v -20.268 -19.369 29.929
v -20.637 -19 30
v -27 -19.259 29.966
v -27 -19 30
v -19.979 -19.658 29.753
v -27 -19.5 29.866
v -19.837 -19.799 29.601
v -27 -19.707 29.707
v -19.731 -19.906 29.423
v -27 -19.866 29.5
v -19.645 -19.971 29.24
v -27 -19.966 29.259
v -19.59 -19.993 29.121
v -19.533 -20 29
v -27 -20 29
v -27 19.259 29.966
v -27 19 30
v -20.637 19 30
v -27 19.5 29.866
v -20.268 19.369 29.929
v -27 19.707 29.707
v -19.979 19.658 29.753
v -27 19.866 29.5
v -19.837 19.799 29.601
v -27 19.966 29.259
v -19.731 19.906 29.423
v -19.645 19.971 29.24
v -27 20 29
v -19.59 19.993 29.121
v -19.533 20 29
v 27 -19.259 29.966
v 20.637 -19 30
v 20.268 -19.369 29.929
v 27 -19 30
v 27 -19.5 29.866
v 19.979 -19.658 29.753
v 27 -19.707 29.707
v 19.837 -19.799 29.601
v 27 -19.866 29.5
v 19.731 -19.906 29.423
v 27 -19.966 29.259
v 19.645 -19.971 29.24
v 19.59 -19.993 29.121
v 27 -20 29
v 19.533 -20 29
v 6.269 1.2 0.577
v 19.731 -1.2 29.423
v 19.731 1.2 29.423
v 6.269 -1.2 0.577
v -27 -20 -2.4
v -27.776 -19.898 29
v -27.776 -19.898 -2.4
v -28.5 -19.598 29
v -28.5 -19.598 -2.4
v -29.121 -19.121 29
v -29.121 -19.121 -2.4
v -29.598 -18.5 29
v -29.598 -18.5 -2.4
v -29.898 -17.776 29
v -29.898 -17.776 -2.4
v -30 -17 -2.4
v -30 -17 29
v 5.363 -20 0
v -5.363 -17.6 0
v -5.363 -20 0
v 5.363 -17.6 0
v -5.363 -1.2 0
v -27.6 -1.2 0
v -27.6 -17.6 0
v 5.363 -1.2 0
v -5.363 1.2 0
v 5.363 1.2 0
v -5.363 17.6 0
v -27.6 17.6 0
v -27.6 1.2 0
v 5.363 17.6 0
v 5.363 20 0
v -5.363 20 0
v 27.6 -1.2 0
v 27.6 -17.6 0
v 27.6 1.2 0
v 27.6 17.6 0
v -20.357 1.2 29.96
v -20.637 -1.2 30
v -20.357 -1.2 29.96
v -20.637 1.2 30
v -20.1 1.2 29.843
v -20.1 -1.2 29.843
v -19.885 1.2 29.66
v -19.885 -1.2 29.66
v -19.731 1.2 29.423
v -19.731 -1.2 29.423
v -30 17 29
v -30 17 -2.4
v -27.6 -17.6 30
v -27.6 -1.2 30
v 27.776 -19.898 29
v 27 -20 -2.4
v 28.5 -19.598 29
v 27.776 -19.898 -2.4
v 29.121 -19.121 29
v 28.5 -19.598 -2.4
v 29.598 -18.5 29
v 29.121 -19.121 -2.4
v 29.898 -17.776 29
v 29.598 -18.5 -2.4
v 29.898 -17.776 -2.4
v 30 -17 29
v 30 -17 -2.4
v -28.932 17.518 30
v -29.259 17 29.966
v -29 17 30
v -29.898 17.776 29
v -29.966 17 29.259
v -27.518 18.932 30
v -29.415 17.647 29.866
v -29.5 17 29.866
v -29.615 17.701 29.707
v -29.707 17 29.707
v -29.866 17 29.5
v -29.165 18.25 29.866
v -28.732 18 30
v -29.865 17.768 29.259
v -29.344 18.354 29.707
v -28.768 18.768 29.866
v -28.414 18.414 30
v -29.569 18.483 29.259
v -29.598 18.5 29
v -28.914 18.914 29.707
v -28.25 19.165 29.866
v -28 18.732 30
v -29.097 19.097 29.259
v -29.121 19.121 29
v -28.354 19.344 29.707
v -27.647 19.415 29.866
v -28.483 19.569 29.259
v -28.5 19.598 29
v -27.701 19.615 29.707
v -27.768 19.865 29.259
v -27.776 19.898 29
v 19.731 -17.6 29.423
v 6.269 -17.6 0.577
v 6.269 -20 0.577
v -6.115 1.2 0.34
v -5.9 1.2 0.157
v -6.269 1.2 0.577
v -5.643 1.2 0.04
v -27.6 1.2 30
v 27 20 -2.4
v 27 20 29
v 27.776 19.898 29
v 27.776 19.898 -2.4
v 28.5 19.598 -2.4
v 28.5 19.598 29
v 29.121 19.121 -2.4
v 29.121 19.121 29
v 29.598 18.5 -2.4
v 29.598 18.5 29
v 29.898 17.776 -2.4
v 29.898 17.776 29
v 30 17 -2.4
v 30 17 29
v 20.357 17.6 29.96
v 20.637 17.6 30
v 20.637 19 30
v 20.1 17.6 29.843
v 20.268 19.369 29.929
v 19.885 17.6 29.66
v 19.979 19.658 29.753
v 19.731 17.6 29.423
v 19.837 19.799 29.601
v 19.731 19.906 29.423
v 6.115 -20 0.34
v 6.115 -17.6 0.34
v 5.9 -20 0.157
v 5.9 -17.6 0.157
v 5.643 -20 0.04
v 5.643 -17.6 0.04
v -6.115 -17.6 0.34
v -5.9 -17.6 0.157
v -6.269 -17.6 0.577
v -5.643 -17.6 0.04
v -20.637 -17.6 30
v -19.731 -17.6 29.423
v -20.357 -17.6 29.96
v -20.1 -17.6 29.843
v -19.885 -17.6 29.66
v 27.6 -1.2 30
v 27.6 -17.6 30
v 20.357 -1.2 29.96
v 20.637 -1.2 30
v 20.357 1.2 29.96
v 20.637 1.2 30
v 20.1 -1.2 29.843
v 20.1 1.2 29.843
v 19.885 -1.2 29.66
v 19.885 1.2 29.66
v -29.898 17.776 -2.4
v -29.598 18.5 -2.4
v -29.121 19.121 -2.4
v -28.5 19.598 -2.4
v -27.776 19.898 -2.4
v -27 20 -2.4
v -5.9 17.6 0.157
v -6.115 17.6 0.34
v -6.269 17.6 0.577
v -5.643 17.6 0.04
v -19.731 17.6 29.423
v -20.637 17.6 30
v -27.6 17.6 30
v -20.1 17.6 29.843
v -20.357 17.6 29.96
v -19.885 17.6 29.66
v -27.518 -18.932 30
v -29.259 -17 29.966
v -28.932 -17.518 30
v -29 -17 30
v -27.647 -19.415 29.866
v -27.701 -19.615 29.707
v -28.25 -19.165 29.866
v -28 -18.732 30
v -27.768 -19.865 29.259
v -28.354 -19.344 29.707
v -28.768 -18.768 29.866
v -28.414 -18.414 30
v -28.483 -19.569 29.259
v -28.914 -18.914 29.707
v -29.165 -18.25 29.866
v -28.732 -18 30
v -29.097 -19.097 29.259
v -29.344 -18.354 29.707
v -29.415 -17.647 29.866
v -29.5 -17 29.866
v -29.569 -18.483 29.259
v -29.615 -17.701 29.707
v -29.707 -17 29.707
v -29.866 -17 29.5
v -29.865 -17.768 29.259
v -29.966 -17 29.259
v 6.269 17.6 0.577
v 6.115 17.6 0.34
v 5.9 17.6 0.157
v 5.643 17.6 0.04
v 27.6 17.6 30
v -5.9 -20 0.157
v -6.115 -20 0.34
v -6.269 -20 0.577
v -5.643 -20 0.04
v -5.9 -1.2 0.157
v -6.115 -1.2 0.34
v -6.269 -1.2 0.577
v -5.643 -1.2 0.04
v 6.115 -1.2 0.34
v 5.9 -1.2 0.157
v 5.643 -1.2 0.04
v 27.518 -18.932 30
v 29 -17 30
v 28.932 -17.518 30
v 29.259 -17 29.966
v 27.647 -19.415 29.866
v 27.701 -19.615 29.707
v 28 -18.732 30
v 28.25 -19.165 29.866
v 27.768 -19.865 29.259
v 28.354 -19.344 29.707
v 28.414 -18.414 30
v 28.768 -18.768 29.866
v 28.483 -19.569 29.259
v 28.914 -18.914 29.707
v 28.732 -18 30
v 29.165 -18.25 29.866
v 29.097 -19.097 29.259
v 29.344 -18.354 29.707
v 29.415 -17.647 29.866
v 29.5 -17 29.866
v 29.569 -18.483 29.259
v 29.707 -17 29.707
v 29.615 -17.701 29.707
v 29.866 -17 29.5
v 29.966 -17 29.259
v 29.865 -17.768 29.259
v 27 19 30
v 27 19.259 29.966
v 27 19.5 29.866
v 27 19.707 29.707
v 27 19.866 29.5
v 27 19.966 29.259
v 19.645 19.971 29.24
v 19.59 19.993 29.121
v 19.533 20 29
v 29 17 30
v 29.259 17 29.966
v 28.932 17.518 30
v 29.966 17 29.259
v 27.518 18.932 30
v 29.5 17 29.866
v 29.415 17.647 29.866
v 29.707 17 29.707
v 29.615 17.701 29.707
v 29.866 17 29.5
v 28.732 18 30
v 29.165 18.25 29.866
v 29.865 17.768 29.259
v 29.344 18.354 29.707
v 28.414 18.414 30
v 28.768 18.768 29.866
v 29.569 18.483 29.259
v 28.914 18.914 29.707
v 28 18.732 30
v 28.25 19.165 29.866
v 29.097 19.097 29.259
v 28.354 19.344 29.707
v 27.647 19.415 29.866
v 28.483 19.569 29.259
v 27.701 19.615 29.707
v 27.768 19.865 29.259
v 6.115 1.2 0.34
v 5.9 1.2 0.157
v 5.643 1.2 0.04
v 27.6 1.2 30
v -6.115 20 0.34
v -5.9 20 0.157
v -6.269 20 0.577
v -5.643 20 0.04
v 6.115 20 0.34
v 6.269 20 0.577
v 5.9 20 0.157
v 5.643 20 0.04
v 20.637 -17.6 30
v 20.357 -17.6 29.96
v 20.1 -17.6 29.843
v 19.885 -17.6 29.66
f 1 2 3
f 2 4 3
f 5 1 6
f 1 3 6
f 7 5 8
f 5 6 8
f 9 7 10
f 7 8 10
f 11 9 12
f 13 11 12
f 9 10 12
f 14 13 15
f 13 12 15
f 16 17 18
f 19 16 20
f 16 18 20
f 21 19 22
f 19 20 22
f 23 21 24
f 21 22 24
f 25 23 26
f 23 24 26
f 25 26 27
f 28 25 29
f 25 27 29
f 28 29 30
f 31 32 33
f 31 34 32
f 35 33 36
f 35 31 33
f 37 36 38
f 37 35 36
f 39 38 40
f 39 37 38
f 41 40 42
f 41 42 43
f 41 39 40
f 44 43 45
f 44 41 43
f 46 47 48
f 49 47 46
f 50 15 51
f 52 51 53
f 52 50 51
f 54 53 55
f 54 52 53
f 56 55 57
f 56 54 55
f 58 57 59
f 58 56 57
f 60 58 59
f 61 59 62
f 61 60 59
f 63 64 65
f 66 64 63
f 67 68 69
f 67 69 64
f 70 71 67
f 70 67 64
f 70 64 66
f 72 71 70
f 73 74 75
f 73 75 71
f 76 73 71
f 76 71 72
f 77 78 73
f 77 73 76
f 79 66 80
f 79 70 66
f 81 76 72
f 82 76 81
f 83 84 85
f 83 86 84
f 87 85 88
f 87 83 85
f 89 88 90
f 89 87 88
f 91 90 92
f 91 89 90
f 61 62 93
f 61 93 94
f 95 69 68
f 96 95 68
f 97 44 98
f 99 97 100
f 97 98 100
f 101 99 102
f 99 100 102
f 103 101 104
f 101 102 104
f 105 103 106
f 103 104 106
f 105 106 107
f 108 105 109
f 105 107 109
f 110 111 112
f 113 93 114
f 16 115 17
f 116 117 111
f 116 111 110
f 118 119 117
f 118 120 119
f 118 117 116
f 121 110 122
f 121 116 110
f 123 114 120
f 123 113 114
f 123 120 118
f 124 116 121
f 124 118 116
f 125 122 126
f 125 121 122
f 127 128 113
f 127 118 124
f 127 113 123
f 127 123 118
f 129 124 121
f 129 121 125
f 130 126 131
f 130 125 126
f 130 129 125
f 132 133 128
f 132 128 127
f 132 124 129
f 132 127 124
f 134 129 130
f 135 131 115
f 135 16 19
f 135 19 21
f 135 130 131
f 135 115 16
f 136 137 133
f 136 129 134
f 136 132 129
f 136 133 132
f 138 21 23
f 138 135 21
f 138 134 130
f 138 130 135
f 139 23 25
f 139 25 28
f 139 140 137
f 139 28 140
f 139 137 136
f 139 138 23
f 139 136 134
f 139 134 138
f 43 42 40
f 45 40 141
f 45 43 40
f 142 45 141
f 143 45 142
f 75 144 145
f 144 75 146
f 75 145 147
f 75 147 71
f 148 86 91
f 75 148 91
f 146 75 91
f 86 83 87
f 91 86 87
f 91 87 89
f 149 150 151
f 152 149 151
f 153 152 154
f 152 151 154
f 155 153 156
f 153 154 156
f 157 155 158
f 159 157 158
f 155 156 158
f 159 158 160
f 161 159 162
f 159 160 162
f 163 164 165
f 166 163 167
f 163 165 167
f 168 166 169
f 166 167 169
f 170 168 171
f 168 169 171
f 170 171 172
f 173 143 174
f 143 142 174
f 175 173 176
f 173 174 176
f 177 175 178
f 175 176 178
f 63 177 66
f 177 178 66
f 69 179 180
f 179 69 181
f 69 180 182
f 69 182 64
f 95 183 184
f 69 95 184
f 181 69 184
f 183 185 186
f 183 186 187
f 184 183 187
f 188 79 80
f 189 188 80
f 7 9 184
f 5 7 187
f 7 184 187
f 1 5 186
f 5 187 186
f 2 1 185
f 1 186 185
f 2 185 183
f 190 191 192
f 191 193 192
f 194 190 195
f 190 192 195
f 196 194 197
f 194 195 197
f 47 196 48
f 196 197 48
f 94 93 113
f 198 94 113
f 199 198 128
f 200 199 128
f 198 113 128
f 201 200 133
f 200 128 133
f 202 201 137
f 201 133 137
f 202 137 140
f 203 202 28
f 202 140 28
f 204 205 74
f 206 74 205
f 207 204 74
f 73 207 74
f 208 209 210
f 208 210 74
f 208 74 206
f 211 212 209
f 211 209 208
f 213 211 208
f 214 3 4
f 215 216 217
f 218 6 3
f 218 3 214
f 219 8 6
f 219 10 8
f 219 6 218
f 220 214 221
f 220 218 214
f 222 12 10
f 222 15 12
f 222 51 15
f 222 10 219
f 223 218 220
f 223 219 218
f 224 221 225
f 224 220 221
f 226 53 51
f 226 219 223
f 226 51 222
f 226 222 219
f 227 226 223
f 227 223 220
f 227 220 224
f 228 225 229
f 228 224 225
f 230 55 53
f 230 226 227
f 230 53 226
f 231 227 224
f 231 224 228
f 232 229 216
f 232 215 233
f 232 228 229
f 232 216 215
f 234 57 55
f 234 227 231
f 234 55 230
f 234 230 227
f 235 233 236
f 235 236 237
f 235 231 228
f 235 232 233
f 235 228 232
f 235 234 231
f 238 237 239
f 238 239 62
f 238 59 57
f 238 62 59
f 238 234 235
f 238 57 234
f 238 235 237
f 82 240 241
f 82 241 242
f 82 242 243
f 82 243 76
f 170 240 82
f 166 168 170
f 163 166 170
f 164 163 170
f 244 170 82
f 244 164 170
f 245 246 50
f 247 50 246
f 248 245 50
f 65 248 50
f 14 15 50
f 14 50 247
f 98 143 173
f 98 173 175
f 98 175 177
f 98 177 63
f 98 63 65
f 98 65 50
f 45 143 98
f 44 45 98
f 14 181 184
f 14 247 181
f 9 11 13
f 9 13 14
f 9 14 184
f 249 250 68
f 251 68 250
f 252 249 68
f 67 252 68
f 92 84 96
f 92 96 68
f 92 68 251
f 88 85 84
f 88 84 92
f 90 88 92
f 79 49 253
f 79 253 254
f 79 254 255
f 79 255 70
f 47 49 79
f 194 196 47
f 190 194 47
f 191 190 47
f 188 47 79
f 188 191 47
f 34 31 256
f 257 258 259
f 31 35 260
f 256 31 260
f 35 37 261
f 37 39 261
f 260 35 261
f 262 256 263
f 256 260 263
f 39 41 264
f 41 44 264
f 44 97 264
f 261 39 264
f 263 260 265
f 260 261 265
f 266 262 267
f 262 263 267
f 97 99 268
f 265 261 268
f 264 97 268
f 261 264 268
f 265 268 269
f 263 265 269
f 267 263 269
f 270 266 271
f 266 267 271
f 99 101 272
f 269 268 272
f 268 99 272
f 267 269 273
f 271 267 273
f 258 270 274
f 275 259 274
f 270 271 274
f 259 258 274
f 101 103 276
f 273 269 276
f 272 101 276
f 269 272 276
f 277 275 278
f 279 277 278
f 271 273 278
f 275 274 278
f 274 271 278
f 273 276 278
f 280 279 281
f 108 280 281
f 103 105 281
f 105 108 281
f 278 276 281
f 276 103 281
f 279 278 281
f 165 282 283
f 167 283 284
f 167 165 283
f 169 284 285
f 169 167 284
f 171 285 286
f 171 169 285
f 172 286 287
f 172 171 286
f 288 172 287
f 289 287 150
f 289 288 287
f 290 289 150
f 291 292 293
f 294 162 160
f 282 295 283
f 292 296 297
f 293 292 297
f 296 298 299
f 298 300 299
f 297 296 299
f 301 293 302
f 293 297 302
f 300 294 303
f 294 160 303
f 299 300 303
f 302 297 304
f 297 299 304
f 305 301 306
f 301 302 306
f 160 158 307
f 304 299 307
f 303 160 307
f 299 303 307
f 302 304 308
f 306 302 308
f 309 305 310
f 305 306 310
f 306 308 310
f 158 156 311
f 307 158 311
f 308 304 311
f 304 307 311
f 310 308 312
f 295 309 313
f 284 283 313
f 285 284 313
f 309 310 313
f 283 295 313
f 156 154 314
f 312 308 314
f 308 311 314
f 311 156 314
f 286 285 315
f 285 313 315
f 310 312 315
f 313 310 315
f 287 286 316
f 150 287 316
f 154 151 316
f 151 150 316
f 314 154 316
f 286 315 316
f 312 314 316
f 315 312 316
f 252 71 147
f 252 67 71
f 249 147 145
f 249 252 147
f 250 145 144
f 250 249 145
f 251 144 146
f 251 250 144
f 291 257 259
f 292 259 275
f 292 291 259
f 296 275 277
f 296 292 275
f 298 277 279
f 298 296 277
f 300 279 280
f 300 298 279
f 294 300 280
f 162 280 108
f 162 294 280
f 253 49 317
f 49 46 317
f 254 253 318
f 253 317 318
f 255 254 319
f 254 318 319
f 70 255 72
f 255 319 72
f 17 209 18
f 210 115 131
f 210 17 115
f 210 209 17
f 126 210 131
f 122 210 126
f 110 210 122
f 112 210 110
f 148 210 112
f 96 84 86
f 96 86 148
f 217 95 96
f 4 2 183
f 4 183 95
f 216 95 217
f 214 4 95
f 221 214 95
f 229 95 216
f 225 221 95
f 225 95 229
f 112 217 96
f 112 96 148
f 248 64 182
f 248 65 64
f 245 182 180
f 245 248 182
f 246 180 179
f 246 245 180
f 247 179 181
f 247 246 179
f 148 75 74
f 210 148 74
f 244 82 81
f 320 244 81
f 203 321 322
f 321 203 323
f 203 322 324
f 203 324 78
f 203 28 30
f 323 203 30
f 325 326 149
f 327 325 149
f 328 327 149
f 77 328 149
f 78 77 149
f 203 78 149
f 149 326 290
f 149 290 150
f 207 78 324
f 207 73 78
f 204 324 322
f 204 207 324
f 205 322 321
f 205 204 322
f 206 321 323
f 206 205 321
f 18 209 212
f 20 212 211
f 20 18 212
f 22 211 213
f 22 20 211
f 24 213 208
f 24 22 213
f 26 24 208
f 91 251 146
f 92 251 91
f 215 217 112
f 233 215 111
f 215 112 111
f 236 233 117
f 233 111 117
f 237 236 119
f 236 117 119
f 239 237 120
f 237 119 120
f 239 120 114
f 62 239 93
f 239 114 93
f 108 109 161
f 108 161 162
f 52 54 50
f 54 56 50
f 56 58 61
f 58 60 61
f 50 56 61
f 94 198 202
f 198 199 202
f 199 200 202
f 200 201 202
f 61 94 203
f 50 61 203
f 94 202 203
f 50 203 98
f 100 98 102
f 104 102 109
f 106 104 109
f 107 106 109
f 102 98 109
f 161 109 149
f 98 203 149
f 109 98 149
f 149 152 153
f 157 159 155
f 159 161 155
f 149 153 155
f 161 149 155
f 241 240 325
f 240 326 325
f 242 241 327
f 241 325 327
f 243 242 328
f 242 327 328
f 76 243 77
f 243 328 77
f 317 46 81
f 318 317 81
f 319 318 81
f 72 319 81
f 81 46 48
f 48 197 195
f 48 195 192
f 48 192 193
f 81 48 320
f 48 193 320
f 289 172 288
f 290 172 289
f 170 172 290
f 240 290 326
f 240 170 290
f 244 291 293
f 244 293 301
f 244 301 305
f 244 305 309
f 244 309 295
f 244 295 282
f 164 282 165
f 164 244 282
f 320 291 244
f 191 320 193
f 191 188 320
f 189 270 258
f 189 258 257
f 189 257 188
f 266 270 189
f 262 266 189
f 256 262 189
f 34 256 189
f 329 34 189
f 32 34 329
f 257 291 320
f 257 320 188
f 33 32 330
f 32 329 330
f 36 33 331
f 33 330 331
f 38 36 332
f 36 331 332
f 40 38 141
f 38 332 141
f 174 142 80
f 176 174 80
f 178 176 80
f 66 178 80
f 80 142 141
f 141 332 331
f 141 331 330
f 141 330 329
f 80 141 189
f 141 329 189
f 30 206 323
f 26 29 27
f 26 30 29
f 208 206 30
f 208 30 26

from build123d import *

# Parameters (mm, degrees)
F0_W      = 60
F0_H      = 40
F1_DEPTH  = 2.4
F3_DEPTH  = 1.2
F13_DEPTH = 30
F14_R     = 3
F15_R     = 1


with BuildPart() as f1:
    # F0 (on Top) → F1 (new body)
    with BuildSketch(Plane.XY):
        Rectangle(F0_W, F0_H)
    extrude(amount=-F1_DEPTH)



with BuildPart() as f3:
    # F2 (on Front) → F3 (new body, symmetric)
    with BuildSketch(Plane.XZ):
        Polygon((-30, 30), (-30, 0), (-6, 0), (-20, 30), align=None)
    extrude(amount=F3_DEPTH, both=True)


with BuildPart() as f3b:
    # F2 (on Front) → F3, piece 2 (new body, symmetric)
    with BuildSketch(Plane.XZ):
        Polygon((6, 0), (30, 0), (30, 30), (20, 30), align=None)
    extrude(amount=F3_DEPTH, both=True)


with BuildPart() as f4_1:
    # F4: copy of F3
    add(f3.part.moved(Location((0, 18.8, 0))))


with BuildPart() as f5_1:
    # F5: copy of F3
    add(f3.part.moved(Location((0, -18.8, 0))))


with BuildPart() as f6_1:
    # F6: copy of F3b
    add(f3b.part.moved(Location((0, 18.8, 0))))


with BuildPart() as f7_1:
    # F7: copy of F3b
    add(f3b.part.moved(Location((0, -18.8, 0))))


with BuildPart() as f8_1:
    # F8: copy of F3
    add(f3.part.moved(Location((2.4, 0, 0))))


with BuildPart() as f8_2:
    # F8: copy of F5_1
    add(f5_1.part.moved(Location((2.4, 0, 0))))


with BuildPart() as f8_3:
    # F8: copy of F4_1
    add(f4_1.part.moved(Location((2.4, 0, 0))))


with BuildPart() as f1_1:
    add(f1.part)

    add(f3.part)  # F13 merges F3

    add(f3b.part)  # F13 merges F3b

    add(f4_1.part)  # F13 merges F4_1

    add(f5_1.part)  # F13 merges F5_1

    add(f6_1.part)  # F13 merges F6_1

    add(f7_1.part)  # F13 merges F7_1
    # F12 (on face) → F13 (join)
    with BuildSketch(Plane.XY):
        Polygon((27.6, 17.6), (27.6, -17.6), (27.6, -20), (30, -20), (30, 20), (27.6, 20), align=None)
        Polygon((-27.6, -20), (-27.6, -17.6), (-27.6, 17.6), (-27.6, 20), (-30, 20), (-30, -20), align=None)
    extrude(amount=F13_DEPTH)

    # F14
    f14_edges = [f1_1.edges().sort_by_distance(p)[0] for p in [
        (30, -20, 13.8),
        (-30, -20, 13.8),
        (-30, 20, 13.8),
        (30, 20, 13.8),
    ]]
    fillet(f14_edges, radius=F14_R)

    # F15
    f15_edges = [f1_1.edges().sort_by_distance(p)[0] for p in [
        (20, 18.8, 30),
        (20, 0, 30),
        (20, -18.8, 30),
        (6, 18.8, 0),
        (6, 0, 0),
        (6, -18.8, 0),
        (-20, 18.8, 30),
        (-20, 0, 30),
        (-20, -18.8, 30),
        (-6, -18.8, 0),
        (-6, 0, 0),
        (-6, 18.8, 0),
        (30, 0, 30),
        (-30, 0, 30),
    ]]
    fillet(f15_edges, radius=F15_R)


solid = f1_1.part
